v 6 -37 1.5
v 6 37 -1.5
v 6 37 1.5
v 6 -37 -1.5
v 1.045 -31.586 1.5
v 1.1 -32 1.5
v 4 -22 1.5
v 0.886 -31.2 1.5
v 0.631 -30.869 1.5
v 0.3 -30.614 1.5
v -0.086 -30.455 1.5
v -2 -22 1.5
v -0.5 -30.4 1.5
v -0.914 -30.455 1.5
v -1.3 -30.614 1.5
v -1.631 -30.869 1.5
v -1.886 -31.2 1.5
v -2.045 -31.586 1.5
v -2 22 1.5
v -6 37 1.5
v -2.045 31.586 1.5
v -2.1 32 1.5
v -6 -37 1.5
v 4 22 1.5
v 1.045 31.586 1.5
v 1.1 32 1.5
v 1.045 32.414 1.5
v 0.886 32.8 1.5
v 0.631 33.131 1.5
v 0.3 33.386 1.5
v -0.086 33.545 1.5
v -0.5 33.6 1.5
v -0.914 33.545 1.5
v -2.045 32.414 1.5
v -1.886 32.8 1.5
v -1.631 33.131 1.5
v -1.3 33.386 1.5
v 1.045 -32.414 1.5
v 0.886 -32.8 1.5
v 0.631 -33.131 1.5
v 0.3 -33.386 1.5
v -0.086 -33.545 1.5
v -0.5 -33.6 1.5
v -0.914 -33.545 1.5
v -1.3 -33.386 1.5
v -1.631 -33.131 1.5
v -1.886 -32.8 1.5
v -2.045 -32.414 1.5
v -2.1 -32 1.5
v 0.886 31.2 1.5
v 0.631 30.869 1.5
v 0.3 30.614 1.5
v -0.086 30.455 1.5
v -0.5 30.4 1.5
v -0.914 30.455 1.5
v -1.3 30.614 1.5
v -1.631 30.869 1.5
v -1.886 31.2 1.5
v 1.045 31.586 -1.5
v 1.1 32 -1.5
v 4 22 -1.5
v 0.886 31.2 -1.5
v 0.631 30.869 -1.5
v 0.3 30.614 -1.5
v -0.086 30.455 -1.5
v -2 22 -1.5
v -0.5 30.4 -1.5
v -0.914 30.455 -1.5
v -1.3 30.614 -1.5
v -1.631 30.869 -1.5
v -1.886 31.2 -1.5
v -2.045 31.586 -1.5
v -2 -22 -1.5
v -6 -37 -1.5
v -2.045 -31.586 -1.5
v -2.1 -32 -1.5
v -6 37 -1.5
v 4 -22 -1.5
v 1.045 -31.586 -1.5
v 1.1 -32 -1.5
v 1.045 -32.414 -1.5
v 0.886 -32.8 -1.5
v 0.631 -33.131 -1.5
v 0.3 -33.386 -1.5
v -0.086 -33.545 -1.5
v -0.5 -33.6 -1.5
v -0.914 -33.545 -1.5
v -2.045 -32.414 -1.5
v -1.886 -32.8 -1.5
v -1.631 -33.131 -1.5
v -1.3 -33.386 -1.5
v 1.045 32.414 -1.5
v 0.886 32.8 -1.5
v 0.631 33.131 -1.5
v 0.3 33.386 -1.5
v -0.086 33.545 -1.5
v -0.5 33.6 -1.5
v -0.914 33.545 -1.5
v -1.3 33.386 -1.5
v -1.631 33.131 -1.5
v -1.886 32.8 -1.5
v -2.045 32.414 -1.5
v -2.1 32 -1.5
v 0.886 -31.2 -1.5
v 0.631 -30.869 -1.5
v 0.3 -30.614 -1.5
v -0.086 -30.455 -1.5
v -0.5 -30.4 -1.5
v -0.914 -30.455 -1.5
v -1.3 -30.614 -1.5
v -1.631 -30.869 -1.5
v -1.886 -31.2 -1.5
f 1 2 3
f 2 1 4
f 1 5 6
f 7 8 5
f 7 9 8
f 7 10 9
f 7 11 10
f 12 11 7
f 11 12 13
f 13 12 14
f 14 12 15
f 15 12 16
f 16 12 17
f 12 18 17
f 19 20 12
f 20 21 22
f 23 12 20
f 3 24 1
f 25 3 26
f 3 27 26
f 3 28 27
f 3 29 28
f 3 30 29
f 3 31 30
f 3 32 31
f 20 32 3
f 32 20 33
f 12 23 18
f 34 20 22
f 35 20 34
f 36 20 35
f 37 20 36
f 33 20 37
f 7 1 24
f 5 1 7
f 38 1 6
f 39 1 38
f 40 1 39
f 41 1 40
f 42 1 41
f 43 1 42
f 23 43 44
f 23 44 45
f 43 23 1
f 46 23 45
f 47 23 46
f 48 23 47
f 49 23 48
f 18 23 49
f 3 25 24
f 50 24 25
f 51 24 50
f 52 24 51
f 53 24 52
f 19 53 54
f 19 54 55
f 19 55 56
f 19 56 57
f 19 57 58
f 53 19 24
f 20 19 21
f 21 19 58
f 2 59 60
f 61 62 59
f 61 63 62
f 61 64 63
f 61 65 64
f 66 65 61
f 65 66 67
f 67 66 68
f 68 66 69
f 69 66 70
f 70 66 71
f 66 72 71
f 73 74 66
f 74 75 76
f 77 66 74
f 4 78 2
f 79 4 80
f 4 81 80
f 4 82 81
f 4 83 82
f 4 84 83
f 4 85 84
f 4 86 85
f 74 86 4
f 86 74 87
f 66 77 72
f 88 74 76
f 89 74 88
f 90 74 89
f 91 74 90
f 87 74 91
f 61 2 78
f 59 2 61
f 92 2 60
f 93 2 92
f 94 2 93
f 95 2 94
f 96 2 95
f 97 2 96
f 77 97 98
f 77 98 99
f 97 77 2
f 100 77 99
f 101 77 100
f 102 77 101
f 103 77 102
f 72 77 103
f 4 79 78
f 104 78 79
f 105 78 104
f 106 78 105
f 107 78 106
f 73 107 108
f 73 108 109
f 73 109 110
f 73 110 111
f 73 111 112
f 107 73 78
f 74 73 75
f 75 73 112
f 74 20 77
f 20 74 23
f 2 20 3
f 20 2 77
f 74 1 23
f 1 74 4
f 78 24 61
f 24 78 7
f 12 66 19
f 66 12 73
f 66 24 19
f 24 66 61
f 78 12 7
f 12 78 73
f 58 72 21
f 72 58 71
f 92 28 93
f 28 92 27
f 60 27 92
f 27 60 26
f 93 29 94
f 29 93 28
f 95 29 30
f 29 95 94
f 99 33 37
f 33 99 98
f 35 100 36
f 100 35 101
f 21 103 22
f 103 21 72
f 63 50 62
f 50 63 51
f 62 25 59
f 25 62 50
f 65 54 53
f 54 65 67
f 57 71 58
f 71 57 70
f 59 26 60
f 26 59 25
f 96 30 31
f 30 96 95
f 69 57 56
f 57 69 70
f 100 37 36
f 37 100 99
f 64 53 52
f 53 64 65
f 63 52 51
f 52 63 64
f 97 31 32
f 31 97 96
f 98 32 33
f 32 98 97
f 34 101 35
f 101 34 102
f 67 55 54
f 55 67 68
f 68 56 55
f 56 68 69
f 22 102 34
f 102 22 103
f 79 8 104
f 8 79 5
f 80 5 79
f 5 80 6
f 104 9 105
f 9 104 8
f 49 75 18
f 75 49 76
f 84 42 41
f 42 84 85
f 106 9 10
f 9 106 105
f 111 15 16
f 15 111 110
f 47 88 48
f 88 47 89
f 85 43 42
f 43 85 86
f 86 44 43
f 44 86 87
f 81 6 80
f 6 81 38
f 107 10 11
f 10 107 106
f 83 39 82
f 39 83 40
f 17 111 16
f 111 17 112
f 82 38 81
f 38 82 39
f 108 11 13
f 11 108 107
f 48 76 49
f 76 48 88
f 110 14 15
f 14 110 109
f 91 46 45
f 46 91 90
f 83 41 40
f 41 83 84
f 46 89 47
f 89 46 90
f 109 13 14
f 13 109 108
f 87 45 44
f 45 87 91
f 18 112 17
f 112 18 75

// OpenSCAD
difference(){
    translate([0,0,0])
        cube([12,74,3], center=true);
    translate([1,0,0])
        cube([6,44,30], center=true);
    translate([-0.5,32,0])
        cylinder(r=1.6, $fn=24, h=6, center=true);
    translate([-0.5,-32,0])
        cylinder(r=1.6, $fn=24, h=6, center=true);
};
